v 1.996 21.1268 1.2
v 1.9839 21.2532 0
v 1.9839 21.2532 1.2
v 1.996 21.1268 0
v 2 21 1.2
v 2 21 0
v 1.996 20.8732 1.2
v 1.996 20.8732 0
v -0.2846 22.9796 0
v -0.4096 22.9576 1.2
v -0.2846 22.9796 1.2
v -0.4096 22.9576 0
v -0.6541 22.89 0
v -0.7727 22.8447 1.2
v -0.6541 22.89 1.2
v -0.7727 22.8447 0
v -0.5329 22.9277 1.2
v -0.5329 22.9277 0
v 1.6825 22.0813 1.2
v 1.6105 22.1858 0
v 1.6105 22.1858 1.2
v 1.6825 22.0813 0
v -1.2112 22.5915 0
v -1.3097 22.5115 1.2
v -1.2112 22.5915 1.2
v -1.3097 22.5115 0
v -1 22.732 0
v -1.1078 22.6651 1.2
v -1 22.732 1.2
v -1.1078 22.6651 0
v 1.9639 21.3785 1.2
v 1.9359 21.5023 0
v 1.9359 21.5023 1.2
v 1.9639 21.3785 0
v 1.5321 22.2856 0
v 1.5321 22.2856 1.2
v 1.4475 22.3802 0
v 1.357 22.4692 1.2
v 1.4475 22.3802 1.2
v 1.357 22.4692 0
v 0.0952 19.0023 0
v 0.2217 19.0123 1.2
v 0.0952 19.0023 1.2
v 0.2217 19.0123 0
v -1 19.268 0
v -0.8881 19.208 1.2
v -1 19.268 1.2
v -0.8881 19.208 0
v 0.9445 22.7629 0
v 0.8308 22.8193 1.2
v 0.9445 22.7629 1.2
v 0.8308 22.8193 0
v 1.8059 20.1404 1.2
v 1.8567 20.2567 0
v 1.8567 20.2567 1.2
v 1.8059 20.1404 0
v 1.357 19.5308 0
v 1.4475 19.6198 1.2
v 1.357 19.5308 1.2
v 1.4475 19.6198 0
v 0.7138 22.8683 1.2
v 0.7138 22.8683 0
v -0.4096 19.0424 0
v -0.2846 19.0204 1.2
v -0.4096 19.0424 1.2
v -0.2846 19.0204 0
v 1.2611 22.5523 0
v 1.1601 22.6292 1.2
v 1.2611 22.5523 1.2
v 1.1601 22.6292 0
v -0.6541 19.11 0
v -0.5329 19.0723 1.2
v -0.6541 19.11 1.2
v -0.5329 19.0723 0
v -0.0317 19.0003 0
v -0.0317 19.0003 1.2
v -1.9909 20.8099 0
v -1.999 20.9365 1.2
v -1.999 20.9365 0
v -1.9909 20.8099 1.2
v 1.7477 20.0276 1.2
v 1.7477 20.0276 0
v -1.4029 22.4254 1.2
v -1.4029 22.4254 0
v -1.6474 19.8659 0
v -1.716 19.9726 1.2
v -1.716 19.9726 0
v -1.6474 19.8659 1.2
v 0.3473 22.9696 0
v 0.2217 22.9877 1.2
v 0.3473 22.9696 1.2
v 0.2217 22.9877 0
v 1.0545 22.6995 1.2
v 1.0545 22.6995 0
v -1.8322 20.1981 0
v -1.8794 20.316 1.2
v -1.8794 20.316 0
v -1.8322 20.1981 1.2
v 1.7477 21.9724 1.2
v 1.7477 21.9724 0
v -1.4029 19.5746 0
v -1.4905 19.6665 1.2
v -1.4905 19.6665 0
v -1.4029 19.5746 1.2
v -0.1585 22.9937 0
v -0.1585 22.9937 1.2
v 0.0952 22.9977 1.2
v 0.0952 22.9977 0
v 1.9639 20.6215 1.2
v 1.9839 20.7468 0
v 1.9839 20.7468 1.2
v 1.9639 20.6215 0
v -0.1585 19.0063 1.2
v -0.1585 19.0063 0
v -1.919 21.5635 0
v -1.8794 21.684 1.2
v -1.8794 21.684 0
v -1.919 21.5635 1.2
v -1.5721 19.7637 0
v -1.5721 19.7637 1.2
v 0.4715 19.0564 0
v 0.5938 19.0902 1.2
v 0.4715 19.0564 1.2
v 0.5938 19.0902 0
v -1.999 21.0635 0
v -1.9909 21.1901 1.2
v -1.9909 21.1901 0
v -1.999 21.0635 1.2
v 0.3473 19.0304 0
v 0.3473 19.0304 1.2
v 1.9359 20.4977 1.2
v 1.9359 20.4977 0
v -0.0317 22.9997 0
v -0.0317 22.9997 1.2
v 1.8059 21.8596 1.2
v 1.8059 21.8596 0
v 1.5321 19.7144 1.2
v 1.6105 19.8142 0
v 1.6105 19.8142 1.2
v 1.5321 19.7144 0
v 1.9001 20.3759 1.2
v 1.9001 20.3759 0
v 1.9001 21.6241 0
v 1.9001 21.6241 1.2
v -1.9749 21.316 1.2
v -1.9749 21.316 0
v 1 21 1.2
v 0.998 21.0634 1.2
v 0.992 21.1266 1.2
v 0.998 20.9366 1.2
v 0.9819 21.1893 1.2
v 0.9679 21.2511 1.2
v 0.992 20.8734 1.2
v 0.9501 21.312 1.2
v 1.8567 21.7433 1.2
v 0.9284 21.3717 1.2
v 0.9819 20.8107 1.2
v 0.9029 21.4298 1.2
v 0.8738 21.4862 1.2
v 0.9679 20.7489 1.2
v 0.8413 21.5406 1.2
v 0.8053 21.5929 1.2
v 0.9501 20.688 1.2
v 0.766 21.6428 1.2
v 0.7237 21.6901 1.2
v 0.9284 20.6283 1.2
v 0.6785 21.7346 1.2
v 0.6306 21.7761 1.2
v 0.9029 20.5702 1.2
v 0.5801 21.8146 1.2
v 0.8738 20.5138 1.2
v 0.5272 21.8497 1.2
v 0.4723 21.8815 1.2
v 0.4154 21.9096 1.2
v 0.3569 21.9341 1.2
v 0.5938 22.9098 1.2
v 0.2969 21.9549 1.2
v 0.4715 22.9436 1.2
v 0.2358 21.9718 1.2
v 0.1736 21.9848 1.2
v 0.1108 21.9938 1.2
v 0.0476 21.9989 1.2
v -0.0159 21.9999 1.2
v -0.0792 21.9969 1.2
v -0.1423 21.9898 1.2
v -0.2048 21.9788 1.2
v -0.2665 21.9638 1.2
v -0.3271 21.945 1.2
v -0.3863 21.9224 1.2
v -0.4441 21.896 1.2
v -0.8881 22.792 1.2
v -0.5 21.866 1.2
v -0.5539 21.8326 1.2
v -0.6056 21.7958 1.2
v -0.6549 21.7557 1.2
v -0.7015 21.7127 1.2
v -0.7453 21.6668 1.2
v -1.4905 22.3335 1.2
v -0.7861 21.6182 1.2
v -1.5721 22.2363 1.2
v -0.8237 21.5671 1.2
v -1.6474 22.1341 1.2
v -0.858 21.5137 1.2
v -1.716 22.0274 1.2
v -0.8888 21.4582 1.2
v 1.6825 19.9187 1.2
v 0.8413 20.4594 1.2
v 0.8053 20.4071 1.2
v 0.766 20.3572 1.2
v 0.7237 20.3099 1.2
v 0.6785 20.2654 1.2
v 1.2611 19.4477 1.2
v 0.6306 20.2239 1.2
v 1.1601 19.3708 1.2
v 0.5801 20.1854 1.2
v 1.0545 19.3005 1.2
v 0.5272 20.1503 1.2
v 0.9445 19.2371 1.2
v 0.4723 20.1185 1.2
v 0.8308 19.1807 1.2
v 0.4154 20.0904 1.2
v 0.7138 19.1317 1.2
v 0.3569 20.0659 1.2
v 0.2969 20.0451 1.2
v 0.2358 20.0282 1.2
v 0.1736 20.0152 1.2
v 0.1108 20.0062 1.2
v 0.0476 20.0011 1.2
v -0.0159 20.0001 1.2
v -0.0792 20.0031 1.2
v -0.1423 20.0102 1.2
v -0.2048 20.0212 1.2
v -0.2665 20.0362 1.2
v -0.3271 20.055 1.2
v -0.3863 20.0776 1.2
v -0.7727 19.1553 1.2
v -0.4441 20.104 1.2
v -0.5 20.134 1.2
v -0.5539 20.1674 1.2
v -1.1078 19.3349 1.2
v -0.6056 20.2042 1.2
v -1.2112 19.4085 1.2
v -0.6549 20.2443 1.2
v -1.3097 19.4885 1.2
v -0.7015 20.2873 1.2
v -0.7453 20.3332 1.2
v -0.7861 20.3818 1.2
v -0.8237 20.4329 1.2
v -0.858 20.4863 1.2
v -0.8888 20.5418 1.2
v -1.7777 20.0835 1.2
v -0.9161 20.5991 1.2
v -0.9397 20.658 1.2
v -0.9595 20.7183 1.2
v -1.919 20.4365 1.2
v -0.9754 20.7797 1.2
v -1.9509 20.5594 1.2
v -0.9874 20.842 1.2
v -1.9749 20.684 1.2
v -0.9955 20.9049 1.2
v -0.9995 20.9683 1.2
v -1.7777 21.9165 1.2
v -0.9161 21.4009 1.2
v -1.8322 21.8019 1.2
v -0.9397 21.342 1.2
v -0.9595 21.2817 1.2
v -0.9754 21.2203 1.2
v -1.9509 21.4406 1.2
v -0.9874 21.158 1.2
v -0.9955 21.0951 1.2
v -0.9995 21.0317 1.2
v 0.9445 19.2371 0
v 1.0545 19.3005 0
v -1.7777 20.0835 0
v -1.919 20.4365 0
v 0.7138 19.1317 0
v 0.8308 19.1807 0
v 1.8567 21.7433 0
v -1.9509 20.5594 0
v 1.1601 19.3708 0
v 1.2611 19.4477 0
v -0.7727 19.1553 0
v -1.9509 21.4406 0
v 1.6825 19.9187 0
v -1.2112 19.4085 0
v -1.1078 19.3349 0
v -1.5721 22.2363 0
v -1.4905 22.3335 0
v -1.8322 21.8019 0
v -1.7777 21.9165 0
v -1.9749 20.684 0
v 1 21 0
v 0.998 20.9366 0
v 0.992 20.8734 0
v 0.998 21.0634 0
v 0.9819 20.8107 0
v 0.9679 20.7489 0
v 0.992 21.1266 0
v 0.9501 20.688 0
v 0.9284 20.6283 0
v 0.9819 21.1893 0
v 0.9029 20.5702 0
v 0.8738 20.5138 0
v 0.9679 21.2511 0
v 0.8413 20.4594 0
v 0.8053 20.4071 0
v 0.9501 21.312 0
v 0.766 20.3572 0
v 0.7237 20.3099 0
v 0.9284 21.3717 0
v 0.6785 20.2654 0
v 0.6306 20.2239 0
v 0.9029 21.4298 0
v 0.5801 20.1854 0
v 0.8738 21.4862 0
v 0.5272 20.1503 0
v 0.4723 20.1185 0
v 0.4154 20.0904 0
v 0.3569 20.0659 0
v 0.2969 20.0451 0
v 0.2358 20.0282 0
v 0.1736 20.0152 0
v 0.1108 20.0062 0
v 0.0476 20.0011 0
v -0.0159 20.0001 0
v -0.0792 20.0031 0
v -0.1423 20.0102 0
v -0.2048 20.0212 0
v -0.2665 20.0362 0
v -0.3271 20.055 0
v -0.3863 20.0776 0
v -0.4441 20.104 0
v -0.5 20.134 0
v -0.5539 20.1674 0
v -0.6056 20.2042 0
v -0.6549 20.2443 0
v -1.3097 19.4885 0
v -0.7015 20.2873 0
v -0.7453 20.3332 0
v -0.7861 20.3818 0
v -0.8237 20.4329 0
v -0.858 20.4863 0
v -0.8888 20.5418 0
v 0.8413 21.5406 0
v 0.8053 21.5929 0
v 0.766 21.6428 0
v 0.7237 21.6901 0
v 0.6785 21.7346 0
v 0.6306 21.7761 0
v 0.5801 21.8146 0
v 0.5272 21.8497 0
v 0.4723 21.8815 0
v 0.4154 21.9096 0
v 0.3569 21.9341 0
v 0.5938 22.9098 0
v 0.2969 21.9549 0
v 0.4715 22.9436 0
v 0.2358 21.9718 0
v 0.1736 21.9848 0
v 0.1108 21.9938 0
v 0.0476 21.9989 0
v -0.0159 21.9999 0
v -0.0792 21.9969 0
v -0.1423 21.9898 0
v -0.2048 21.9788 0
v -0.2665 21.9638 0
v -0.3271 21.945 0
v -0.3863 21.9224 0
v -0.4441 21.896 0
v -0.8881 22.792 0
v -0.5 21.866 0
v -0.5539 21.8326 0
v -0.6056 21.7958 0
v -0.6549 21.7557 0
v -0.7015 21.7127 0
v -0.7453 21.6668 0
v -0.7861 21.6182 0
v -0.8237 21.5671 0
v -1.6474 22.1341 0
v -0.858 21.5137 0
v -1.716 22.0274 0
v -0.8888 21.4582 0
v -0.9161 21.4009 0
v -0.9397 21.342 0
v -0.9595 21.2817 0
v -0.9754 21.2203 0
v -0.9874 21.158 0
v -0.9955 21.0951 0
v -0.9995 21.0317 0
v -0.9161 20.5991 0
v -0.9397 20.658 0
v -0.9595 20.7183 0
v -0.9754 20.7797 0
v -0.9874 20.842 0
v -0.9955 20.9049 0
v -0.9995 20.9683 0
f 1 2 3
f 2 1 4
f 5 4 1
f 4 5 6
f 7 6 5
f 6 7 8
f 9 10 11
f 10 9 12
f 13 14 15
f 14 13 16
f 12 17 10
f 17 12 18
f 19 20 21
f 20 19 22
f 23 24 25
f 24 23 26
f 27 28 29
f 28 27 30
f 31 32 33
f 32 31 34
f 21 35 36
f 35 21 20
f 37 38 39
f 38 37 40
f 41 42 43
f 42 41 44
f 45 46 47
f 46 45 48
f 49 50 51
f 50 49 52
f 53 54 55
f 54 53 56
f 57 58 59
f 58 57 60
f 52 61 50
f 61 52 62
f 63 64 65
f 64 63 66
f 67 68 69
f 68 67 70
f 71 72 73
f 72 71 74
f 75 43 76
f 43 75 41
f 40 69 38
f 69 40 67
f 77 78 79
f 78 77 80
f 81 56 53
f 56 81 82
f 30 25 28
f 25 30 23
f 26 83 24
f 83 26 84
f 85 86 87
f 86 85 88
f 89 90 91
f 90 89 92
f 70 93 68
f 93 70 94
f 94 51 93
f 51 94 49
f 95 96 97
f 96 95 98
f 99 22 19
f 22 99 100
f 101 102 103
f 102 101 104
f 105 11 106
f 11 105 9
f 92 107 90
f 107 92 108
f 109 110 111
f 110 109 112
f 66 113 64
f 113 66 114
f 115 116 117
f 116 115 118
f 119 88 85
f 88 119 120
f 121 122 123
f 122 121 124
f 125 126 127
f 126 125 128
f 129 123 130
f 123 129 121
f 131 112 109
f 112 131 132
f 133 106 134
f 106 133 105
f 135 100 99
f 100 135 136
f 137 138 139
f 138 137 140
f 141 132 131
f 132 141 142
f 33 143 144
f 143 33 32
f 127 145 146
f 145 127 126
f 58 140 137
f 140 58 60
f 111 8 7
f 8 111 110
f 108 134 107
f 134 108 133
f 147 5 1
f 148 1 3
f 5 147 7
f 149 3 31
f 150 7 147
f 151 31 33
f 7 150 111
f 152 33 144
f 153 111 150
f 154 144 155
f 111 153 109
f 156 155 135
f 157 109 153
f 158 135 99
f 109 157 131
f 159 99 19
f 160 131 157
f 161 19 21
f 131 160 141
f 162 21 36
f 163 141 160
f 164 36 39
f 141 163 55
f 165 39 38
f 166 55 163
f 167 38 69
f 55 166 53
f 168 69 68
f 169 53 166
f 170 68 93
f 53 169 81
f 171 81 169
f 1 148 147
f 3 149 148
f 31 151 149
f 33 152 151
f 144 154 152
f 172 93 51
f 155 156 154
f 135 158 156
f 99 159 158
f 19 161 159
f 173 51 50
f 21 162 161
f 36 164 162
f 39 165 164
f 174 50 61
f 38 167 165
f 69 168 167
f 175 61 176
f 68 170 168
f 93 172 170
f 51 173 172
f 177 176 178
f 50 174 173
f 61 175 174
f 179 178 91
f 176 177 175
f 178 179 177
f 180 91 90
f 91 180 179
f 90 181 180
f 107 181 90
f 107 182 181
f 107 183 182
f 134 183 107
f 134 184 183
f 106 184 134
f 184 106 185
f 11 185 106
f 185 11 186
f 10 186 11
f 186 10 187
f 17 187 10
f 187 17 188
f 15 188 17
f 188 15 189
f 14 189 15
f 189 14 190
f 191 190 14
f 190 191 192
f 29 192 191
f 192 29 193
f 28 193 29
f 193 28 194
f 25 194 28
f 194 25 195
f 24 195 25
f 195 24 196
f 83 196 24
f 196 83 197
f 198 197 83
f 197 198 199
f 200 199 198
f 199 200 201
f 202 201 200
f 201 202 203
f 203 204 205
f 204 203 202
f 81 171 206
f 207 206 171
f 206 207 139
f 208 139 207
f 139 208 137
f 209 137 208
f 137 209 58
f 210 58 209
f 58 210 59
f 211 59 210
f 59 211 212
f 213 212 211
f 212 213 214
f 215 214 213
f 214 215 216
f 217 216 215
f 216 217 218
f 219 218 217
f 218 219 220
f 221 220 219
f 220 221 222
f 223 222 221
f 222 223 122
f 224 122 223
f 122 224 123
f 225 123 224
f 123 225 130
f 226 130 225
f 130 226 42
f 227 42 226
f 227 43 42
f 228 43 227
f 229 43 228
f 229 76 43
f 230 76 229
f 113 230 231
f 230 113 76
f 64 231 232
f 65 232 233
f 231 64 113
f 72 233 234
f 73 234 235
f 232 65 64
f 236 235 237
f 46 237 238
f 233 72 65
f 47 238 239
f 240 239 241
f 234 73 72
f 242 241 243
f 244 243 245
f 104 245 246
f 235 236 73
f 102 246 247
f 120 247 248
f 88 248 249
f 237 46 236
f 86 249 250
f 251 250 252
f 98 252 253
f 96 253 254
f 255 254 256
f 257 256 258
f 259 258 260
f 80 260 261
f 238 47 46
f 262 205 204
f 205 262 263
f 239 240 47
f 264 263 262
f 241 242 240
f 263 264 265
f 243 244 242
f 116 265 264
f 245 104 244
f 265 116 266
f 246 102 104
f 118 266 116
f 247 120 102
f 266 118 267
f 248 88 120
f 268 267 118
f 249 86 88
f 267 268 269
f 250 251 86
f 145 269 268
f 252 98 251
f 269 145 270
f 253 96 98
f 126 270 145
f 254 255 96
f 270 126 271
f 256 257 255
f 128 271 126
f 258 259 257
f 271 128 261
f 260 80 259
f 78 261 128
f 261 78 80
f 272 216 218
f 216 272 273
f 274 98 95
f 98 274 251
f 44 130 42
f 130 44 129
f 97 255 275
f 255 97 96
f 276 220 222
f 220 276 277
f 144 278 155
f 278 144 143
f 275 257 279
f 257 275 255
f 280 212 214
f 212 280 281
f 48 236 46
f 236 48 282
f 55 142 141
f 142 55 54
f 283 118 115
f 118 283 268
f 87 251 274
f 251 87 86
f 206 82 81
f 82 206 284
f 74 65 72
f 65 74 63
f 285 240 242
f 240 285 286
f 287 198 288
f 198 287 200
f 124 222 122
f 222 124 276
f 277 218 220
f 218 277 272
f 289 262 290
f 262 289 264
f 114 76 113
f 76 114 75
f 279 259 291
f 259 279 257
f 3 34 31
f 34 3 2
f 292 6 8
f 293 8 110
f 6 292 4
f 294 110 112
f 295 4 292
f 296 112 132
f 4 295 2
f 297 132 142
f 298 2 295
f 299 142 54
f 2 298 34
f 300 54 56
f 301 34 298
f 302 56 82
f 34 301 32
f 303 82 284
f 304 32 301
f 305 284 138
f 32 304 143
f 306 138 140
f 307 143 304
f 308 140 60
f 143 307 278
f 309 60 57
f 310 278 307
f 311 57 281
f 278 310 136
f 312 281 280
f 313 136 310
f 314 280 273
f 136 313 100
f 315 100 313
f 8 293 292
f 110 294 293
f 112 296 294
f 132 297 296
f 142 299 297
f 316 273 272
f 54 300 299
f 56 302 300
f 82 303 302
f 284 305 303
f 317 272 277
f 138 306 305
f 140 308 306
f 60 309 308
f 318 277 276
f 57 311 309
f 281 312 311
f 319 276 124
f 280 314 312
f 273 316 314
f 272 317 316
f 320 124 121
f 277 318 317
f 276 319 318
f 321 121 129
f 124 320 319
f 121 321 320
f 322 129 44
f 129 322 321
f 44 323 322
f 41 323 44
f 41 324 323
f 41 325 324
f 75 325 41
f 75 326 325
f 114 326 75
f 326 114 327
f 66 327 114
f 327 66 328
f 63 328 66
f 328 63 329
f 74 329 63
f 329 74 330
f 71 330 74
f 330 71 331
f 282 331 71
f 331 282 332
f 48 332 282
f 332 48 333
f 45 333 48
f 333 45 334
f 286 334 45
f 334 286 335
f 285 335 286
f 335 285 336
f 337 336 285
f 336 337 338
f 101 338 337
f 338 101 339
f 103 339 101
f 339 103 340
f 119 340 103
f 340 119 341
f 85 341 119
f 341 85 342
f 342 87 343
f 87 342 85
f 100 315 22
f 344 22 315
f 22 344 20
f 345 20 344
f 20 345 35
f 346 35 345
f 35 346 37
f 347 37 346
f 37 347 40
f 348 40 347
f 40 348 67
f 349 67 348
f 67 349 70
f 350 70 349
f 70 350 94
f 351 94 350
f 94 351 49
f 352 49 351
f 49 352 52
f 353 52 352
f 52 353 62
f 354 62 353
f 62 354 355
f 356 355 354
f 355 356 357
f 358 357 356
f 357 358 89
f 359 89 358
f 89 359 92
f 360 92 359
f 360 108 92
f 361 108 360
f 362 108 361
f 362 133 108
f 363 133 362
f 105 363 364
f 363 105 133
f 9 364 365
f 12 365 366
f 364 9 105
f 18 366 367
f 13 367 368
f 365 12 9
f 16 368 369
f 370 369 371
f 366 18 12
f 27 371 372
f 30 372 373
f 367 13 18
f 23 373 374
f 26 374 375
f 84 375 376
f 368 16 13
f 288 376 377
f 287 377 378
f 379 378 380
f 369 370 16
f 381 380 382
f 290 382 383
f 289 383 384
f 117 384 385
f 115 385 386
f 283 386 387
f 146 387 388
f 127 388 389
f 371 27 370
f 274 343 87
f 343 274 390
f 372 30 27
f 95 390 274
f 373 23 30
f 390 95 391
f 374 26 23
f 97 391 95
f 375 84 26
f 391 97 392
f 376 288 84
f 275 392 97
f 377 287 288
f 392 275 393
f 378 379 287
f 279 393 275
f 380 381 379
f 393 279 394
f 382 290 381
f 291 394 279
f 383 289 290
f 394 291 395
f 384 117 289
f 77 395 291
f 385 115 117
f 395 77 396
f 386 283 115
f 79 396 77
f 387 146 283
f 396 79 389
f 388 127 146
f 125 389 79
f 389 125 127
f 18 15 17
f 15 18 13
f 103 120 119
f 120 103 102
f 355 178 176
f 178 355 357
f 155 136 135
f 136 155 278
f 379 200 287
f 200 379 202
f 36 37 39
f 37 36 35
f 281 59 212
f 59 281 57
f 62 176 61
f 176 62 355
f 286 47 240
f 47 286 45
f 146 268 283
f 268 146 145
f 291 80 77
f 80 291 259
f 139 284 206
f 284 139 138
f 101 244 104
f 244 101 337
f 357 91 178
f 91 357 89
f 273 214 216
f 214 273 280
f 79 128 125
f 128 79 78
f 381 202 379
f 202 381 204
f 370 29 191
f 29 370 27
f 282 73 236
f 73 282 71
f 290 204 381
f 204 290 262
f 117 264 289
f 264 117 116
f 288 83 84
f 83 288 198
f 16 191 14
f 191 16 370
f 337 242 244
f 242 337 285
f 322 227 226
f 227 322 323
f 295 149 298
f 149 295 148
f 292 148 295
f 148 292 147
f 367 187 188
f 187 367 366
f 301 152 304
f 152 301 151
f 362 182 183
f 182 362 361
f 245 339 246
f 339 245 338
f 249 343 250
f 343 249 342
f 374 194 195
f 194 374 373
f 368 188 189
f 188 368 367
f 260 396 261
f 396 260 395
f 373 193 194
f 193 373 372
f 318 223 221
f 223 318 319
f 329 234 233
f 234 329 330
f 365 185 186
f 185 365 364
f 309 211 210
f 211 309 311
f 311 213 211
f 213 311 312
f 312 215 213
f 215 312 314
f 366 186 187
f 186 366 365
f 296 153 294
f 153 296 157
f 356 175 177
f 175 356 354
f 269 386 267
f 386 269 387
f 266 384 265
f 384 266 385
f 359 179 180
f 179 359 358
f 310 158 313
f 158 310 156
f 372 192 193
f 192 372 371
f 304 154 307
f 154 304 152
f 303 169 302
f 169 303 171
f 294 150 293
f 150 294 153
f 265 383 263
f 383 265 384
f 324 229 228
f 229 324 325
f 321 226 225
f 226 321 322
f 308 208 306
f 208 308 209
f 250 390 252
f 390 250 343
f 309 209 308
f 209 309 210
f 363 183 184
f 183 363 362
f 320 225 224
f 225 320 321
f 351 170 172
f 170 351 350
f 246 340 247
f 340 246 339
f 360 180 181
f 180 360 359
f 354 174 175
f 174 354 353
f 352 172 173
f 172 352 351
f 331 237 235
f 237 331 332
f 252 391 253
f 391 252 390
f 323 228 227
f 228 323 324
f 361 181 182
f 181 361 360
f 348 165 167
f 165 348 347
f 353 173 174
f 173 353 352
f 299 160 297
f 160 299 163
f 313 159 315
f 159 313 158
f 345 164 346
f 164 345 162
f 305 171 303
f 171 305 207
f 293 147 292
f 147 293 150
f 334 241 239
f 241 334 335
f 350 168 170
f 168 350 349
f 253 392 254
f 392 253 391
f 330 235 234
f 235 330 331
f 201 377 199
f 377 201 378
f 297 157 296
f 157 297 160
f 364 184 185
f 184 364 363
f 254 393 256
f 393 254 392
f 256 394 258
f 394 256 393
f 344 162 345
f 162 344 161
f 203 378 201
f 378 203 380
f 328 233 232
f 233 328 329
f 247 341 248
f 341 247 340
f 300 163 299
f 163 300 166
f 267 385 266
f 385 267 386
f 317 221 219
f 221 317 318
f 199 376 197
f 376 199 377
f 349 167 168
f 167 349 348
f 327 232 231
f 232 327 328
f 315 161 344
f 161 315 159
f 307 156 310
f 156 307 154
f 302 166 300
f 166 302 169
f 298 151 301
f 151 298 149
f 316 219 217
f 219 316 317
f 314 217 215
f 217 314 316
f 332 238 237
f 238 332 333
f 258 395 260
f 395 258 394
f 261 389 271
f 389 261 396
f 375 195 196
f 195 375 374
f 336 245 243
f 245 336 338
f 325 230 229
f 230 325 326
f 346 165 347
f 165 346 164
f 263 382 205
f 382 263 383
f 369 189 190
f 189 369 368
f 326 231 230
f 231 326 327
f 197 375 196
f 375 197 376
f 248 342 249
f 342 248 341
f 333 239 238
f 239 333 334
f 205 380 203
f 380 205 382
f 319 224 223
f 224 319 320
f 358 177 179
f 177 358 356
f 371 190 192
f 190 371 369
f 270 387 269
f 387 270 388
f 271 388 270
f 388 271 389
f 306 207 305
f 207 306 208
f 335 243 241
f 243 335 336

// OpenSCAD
//=================================================================================
// FlyingPig.scad
//
//
// Dr Tom Flint, 3 April 2025
//=================================================================================


thick=1.2;
r1=65;
F2=99;

//-----------------------------------------------------------------------------------
module black(){
  
  render()
  intersection(){
    translate([0,0,80])
    scale([1,1,1])
    surface(file="./FlyingPigBlack.png", center = true, invert=true);
  
    translate([0,0,thick/2])
    cube([800,800,thick],center=true);
  }
  
  // hanger loop
    translate([0,210,0])
    difference(){
      cylinder(r=20,h=thick,$fn=F2);
      cylinder(r=10,h=thick,$fn=F2);
    }
}  

//-----------------------------------------------------------------------------------
module pink(){
  
  render()
  intersection(){
    translate([0,0,50])
    scale([1,1,1])
    surface(file="./FlyingPigPink.png", center = true, invert=true);
    
    translate([0,0,thick/2])
    cube([800,800,thick],center=true);
  }
}  

//-----------------------------------------------------------------------------------
module pinkA(){
  
  render()
  intersection(){
    translate([0,0,50])
    scale([1,1,1])
    surface(file="./FlyingPigPink.png", center = true, invert=true);
    
    translate([0,0,0.6/2])
    cube([800,800,0.6],center=true);
  }
}  

//-----------------------------------------------------------------------------------
module pinkB(){
  
  render()
  intersection(){
    translate([0,0,50])
    scale([1,1,1])
    surface(file="./FlyingPigPink.png", center = true, invert=true);
    
    translate([0,0,0.6/2+0.6])
    cube([800,800,0.6],center=true);
  }
}  

//-----------------------------------------------------------------------------------
module wings(){
  
  render()
  intersection(){
    translate([0,0,50])
    scale([1,1,1])
    surface(file="./FlyingPigWings.png", center = true, invert=true);
    
    translate([0,0,thick/2])
    cube([800,800,thick],center=true);
  }
}  

//-----------------------------------------------------------------------------------
module wingsA(){
  
  render()
  intersection(){
    translate([0,0,50])
    scale([1,1,1])
    surface(file="./FlyingPigWings.png", center = true, invert=true);
    
    translate([0,0,thick/4])
    cube([800,800,thick/2],center=true);
  }
}  

//-----------------------------------------------------------------------------------
module wingsB(){
  
  render()
  intersection(){
    translate([0,0,50])
    scale([1,1,1])
    surface(file="./FlyingPigWings.png", center = true, invert=true);
    
    translate([0,0,thick/2+thick/4])
    cube([800,800,thick/2],center=true);
  }
}  

//-----------------------------------------------------------------------------------
module hooves(){
  
  render()
  intersection(){
    translate([0,0,50])
    scale([1,1,1])
    surface(file="./FlyingPigHooves.png", center = true, invert=true);
    
    translate([0,0,thick/2])
    cube([800,800,thick],center=true);
  }
}  

//=================================================================================

scale([0.1,0.1,1]){

black();
//~ pink();
//~ pinkA();
//~ pinkB();
//~ wings();
//~ wingsA();
//~ wingsB();
//~ hooves();

}

//=================================================================================
